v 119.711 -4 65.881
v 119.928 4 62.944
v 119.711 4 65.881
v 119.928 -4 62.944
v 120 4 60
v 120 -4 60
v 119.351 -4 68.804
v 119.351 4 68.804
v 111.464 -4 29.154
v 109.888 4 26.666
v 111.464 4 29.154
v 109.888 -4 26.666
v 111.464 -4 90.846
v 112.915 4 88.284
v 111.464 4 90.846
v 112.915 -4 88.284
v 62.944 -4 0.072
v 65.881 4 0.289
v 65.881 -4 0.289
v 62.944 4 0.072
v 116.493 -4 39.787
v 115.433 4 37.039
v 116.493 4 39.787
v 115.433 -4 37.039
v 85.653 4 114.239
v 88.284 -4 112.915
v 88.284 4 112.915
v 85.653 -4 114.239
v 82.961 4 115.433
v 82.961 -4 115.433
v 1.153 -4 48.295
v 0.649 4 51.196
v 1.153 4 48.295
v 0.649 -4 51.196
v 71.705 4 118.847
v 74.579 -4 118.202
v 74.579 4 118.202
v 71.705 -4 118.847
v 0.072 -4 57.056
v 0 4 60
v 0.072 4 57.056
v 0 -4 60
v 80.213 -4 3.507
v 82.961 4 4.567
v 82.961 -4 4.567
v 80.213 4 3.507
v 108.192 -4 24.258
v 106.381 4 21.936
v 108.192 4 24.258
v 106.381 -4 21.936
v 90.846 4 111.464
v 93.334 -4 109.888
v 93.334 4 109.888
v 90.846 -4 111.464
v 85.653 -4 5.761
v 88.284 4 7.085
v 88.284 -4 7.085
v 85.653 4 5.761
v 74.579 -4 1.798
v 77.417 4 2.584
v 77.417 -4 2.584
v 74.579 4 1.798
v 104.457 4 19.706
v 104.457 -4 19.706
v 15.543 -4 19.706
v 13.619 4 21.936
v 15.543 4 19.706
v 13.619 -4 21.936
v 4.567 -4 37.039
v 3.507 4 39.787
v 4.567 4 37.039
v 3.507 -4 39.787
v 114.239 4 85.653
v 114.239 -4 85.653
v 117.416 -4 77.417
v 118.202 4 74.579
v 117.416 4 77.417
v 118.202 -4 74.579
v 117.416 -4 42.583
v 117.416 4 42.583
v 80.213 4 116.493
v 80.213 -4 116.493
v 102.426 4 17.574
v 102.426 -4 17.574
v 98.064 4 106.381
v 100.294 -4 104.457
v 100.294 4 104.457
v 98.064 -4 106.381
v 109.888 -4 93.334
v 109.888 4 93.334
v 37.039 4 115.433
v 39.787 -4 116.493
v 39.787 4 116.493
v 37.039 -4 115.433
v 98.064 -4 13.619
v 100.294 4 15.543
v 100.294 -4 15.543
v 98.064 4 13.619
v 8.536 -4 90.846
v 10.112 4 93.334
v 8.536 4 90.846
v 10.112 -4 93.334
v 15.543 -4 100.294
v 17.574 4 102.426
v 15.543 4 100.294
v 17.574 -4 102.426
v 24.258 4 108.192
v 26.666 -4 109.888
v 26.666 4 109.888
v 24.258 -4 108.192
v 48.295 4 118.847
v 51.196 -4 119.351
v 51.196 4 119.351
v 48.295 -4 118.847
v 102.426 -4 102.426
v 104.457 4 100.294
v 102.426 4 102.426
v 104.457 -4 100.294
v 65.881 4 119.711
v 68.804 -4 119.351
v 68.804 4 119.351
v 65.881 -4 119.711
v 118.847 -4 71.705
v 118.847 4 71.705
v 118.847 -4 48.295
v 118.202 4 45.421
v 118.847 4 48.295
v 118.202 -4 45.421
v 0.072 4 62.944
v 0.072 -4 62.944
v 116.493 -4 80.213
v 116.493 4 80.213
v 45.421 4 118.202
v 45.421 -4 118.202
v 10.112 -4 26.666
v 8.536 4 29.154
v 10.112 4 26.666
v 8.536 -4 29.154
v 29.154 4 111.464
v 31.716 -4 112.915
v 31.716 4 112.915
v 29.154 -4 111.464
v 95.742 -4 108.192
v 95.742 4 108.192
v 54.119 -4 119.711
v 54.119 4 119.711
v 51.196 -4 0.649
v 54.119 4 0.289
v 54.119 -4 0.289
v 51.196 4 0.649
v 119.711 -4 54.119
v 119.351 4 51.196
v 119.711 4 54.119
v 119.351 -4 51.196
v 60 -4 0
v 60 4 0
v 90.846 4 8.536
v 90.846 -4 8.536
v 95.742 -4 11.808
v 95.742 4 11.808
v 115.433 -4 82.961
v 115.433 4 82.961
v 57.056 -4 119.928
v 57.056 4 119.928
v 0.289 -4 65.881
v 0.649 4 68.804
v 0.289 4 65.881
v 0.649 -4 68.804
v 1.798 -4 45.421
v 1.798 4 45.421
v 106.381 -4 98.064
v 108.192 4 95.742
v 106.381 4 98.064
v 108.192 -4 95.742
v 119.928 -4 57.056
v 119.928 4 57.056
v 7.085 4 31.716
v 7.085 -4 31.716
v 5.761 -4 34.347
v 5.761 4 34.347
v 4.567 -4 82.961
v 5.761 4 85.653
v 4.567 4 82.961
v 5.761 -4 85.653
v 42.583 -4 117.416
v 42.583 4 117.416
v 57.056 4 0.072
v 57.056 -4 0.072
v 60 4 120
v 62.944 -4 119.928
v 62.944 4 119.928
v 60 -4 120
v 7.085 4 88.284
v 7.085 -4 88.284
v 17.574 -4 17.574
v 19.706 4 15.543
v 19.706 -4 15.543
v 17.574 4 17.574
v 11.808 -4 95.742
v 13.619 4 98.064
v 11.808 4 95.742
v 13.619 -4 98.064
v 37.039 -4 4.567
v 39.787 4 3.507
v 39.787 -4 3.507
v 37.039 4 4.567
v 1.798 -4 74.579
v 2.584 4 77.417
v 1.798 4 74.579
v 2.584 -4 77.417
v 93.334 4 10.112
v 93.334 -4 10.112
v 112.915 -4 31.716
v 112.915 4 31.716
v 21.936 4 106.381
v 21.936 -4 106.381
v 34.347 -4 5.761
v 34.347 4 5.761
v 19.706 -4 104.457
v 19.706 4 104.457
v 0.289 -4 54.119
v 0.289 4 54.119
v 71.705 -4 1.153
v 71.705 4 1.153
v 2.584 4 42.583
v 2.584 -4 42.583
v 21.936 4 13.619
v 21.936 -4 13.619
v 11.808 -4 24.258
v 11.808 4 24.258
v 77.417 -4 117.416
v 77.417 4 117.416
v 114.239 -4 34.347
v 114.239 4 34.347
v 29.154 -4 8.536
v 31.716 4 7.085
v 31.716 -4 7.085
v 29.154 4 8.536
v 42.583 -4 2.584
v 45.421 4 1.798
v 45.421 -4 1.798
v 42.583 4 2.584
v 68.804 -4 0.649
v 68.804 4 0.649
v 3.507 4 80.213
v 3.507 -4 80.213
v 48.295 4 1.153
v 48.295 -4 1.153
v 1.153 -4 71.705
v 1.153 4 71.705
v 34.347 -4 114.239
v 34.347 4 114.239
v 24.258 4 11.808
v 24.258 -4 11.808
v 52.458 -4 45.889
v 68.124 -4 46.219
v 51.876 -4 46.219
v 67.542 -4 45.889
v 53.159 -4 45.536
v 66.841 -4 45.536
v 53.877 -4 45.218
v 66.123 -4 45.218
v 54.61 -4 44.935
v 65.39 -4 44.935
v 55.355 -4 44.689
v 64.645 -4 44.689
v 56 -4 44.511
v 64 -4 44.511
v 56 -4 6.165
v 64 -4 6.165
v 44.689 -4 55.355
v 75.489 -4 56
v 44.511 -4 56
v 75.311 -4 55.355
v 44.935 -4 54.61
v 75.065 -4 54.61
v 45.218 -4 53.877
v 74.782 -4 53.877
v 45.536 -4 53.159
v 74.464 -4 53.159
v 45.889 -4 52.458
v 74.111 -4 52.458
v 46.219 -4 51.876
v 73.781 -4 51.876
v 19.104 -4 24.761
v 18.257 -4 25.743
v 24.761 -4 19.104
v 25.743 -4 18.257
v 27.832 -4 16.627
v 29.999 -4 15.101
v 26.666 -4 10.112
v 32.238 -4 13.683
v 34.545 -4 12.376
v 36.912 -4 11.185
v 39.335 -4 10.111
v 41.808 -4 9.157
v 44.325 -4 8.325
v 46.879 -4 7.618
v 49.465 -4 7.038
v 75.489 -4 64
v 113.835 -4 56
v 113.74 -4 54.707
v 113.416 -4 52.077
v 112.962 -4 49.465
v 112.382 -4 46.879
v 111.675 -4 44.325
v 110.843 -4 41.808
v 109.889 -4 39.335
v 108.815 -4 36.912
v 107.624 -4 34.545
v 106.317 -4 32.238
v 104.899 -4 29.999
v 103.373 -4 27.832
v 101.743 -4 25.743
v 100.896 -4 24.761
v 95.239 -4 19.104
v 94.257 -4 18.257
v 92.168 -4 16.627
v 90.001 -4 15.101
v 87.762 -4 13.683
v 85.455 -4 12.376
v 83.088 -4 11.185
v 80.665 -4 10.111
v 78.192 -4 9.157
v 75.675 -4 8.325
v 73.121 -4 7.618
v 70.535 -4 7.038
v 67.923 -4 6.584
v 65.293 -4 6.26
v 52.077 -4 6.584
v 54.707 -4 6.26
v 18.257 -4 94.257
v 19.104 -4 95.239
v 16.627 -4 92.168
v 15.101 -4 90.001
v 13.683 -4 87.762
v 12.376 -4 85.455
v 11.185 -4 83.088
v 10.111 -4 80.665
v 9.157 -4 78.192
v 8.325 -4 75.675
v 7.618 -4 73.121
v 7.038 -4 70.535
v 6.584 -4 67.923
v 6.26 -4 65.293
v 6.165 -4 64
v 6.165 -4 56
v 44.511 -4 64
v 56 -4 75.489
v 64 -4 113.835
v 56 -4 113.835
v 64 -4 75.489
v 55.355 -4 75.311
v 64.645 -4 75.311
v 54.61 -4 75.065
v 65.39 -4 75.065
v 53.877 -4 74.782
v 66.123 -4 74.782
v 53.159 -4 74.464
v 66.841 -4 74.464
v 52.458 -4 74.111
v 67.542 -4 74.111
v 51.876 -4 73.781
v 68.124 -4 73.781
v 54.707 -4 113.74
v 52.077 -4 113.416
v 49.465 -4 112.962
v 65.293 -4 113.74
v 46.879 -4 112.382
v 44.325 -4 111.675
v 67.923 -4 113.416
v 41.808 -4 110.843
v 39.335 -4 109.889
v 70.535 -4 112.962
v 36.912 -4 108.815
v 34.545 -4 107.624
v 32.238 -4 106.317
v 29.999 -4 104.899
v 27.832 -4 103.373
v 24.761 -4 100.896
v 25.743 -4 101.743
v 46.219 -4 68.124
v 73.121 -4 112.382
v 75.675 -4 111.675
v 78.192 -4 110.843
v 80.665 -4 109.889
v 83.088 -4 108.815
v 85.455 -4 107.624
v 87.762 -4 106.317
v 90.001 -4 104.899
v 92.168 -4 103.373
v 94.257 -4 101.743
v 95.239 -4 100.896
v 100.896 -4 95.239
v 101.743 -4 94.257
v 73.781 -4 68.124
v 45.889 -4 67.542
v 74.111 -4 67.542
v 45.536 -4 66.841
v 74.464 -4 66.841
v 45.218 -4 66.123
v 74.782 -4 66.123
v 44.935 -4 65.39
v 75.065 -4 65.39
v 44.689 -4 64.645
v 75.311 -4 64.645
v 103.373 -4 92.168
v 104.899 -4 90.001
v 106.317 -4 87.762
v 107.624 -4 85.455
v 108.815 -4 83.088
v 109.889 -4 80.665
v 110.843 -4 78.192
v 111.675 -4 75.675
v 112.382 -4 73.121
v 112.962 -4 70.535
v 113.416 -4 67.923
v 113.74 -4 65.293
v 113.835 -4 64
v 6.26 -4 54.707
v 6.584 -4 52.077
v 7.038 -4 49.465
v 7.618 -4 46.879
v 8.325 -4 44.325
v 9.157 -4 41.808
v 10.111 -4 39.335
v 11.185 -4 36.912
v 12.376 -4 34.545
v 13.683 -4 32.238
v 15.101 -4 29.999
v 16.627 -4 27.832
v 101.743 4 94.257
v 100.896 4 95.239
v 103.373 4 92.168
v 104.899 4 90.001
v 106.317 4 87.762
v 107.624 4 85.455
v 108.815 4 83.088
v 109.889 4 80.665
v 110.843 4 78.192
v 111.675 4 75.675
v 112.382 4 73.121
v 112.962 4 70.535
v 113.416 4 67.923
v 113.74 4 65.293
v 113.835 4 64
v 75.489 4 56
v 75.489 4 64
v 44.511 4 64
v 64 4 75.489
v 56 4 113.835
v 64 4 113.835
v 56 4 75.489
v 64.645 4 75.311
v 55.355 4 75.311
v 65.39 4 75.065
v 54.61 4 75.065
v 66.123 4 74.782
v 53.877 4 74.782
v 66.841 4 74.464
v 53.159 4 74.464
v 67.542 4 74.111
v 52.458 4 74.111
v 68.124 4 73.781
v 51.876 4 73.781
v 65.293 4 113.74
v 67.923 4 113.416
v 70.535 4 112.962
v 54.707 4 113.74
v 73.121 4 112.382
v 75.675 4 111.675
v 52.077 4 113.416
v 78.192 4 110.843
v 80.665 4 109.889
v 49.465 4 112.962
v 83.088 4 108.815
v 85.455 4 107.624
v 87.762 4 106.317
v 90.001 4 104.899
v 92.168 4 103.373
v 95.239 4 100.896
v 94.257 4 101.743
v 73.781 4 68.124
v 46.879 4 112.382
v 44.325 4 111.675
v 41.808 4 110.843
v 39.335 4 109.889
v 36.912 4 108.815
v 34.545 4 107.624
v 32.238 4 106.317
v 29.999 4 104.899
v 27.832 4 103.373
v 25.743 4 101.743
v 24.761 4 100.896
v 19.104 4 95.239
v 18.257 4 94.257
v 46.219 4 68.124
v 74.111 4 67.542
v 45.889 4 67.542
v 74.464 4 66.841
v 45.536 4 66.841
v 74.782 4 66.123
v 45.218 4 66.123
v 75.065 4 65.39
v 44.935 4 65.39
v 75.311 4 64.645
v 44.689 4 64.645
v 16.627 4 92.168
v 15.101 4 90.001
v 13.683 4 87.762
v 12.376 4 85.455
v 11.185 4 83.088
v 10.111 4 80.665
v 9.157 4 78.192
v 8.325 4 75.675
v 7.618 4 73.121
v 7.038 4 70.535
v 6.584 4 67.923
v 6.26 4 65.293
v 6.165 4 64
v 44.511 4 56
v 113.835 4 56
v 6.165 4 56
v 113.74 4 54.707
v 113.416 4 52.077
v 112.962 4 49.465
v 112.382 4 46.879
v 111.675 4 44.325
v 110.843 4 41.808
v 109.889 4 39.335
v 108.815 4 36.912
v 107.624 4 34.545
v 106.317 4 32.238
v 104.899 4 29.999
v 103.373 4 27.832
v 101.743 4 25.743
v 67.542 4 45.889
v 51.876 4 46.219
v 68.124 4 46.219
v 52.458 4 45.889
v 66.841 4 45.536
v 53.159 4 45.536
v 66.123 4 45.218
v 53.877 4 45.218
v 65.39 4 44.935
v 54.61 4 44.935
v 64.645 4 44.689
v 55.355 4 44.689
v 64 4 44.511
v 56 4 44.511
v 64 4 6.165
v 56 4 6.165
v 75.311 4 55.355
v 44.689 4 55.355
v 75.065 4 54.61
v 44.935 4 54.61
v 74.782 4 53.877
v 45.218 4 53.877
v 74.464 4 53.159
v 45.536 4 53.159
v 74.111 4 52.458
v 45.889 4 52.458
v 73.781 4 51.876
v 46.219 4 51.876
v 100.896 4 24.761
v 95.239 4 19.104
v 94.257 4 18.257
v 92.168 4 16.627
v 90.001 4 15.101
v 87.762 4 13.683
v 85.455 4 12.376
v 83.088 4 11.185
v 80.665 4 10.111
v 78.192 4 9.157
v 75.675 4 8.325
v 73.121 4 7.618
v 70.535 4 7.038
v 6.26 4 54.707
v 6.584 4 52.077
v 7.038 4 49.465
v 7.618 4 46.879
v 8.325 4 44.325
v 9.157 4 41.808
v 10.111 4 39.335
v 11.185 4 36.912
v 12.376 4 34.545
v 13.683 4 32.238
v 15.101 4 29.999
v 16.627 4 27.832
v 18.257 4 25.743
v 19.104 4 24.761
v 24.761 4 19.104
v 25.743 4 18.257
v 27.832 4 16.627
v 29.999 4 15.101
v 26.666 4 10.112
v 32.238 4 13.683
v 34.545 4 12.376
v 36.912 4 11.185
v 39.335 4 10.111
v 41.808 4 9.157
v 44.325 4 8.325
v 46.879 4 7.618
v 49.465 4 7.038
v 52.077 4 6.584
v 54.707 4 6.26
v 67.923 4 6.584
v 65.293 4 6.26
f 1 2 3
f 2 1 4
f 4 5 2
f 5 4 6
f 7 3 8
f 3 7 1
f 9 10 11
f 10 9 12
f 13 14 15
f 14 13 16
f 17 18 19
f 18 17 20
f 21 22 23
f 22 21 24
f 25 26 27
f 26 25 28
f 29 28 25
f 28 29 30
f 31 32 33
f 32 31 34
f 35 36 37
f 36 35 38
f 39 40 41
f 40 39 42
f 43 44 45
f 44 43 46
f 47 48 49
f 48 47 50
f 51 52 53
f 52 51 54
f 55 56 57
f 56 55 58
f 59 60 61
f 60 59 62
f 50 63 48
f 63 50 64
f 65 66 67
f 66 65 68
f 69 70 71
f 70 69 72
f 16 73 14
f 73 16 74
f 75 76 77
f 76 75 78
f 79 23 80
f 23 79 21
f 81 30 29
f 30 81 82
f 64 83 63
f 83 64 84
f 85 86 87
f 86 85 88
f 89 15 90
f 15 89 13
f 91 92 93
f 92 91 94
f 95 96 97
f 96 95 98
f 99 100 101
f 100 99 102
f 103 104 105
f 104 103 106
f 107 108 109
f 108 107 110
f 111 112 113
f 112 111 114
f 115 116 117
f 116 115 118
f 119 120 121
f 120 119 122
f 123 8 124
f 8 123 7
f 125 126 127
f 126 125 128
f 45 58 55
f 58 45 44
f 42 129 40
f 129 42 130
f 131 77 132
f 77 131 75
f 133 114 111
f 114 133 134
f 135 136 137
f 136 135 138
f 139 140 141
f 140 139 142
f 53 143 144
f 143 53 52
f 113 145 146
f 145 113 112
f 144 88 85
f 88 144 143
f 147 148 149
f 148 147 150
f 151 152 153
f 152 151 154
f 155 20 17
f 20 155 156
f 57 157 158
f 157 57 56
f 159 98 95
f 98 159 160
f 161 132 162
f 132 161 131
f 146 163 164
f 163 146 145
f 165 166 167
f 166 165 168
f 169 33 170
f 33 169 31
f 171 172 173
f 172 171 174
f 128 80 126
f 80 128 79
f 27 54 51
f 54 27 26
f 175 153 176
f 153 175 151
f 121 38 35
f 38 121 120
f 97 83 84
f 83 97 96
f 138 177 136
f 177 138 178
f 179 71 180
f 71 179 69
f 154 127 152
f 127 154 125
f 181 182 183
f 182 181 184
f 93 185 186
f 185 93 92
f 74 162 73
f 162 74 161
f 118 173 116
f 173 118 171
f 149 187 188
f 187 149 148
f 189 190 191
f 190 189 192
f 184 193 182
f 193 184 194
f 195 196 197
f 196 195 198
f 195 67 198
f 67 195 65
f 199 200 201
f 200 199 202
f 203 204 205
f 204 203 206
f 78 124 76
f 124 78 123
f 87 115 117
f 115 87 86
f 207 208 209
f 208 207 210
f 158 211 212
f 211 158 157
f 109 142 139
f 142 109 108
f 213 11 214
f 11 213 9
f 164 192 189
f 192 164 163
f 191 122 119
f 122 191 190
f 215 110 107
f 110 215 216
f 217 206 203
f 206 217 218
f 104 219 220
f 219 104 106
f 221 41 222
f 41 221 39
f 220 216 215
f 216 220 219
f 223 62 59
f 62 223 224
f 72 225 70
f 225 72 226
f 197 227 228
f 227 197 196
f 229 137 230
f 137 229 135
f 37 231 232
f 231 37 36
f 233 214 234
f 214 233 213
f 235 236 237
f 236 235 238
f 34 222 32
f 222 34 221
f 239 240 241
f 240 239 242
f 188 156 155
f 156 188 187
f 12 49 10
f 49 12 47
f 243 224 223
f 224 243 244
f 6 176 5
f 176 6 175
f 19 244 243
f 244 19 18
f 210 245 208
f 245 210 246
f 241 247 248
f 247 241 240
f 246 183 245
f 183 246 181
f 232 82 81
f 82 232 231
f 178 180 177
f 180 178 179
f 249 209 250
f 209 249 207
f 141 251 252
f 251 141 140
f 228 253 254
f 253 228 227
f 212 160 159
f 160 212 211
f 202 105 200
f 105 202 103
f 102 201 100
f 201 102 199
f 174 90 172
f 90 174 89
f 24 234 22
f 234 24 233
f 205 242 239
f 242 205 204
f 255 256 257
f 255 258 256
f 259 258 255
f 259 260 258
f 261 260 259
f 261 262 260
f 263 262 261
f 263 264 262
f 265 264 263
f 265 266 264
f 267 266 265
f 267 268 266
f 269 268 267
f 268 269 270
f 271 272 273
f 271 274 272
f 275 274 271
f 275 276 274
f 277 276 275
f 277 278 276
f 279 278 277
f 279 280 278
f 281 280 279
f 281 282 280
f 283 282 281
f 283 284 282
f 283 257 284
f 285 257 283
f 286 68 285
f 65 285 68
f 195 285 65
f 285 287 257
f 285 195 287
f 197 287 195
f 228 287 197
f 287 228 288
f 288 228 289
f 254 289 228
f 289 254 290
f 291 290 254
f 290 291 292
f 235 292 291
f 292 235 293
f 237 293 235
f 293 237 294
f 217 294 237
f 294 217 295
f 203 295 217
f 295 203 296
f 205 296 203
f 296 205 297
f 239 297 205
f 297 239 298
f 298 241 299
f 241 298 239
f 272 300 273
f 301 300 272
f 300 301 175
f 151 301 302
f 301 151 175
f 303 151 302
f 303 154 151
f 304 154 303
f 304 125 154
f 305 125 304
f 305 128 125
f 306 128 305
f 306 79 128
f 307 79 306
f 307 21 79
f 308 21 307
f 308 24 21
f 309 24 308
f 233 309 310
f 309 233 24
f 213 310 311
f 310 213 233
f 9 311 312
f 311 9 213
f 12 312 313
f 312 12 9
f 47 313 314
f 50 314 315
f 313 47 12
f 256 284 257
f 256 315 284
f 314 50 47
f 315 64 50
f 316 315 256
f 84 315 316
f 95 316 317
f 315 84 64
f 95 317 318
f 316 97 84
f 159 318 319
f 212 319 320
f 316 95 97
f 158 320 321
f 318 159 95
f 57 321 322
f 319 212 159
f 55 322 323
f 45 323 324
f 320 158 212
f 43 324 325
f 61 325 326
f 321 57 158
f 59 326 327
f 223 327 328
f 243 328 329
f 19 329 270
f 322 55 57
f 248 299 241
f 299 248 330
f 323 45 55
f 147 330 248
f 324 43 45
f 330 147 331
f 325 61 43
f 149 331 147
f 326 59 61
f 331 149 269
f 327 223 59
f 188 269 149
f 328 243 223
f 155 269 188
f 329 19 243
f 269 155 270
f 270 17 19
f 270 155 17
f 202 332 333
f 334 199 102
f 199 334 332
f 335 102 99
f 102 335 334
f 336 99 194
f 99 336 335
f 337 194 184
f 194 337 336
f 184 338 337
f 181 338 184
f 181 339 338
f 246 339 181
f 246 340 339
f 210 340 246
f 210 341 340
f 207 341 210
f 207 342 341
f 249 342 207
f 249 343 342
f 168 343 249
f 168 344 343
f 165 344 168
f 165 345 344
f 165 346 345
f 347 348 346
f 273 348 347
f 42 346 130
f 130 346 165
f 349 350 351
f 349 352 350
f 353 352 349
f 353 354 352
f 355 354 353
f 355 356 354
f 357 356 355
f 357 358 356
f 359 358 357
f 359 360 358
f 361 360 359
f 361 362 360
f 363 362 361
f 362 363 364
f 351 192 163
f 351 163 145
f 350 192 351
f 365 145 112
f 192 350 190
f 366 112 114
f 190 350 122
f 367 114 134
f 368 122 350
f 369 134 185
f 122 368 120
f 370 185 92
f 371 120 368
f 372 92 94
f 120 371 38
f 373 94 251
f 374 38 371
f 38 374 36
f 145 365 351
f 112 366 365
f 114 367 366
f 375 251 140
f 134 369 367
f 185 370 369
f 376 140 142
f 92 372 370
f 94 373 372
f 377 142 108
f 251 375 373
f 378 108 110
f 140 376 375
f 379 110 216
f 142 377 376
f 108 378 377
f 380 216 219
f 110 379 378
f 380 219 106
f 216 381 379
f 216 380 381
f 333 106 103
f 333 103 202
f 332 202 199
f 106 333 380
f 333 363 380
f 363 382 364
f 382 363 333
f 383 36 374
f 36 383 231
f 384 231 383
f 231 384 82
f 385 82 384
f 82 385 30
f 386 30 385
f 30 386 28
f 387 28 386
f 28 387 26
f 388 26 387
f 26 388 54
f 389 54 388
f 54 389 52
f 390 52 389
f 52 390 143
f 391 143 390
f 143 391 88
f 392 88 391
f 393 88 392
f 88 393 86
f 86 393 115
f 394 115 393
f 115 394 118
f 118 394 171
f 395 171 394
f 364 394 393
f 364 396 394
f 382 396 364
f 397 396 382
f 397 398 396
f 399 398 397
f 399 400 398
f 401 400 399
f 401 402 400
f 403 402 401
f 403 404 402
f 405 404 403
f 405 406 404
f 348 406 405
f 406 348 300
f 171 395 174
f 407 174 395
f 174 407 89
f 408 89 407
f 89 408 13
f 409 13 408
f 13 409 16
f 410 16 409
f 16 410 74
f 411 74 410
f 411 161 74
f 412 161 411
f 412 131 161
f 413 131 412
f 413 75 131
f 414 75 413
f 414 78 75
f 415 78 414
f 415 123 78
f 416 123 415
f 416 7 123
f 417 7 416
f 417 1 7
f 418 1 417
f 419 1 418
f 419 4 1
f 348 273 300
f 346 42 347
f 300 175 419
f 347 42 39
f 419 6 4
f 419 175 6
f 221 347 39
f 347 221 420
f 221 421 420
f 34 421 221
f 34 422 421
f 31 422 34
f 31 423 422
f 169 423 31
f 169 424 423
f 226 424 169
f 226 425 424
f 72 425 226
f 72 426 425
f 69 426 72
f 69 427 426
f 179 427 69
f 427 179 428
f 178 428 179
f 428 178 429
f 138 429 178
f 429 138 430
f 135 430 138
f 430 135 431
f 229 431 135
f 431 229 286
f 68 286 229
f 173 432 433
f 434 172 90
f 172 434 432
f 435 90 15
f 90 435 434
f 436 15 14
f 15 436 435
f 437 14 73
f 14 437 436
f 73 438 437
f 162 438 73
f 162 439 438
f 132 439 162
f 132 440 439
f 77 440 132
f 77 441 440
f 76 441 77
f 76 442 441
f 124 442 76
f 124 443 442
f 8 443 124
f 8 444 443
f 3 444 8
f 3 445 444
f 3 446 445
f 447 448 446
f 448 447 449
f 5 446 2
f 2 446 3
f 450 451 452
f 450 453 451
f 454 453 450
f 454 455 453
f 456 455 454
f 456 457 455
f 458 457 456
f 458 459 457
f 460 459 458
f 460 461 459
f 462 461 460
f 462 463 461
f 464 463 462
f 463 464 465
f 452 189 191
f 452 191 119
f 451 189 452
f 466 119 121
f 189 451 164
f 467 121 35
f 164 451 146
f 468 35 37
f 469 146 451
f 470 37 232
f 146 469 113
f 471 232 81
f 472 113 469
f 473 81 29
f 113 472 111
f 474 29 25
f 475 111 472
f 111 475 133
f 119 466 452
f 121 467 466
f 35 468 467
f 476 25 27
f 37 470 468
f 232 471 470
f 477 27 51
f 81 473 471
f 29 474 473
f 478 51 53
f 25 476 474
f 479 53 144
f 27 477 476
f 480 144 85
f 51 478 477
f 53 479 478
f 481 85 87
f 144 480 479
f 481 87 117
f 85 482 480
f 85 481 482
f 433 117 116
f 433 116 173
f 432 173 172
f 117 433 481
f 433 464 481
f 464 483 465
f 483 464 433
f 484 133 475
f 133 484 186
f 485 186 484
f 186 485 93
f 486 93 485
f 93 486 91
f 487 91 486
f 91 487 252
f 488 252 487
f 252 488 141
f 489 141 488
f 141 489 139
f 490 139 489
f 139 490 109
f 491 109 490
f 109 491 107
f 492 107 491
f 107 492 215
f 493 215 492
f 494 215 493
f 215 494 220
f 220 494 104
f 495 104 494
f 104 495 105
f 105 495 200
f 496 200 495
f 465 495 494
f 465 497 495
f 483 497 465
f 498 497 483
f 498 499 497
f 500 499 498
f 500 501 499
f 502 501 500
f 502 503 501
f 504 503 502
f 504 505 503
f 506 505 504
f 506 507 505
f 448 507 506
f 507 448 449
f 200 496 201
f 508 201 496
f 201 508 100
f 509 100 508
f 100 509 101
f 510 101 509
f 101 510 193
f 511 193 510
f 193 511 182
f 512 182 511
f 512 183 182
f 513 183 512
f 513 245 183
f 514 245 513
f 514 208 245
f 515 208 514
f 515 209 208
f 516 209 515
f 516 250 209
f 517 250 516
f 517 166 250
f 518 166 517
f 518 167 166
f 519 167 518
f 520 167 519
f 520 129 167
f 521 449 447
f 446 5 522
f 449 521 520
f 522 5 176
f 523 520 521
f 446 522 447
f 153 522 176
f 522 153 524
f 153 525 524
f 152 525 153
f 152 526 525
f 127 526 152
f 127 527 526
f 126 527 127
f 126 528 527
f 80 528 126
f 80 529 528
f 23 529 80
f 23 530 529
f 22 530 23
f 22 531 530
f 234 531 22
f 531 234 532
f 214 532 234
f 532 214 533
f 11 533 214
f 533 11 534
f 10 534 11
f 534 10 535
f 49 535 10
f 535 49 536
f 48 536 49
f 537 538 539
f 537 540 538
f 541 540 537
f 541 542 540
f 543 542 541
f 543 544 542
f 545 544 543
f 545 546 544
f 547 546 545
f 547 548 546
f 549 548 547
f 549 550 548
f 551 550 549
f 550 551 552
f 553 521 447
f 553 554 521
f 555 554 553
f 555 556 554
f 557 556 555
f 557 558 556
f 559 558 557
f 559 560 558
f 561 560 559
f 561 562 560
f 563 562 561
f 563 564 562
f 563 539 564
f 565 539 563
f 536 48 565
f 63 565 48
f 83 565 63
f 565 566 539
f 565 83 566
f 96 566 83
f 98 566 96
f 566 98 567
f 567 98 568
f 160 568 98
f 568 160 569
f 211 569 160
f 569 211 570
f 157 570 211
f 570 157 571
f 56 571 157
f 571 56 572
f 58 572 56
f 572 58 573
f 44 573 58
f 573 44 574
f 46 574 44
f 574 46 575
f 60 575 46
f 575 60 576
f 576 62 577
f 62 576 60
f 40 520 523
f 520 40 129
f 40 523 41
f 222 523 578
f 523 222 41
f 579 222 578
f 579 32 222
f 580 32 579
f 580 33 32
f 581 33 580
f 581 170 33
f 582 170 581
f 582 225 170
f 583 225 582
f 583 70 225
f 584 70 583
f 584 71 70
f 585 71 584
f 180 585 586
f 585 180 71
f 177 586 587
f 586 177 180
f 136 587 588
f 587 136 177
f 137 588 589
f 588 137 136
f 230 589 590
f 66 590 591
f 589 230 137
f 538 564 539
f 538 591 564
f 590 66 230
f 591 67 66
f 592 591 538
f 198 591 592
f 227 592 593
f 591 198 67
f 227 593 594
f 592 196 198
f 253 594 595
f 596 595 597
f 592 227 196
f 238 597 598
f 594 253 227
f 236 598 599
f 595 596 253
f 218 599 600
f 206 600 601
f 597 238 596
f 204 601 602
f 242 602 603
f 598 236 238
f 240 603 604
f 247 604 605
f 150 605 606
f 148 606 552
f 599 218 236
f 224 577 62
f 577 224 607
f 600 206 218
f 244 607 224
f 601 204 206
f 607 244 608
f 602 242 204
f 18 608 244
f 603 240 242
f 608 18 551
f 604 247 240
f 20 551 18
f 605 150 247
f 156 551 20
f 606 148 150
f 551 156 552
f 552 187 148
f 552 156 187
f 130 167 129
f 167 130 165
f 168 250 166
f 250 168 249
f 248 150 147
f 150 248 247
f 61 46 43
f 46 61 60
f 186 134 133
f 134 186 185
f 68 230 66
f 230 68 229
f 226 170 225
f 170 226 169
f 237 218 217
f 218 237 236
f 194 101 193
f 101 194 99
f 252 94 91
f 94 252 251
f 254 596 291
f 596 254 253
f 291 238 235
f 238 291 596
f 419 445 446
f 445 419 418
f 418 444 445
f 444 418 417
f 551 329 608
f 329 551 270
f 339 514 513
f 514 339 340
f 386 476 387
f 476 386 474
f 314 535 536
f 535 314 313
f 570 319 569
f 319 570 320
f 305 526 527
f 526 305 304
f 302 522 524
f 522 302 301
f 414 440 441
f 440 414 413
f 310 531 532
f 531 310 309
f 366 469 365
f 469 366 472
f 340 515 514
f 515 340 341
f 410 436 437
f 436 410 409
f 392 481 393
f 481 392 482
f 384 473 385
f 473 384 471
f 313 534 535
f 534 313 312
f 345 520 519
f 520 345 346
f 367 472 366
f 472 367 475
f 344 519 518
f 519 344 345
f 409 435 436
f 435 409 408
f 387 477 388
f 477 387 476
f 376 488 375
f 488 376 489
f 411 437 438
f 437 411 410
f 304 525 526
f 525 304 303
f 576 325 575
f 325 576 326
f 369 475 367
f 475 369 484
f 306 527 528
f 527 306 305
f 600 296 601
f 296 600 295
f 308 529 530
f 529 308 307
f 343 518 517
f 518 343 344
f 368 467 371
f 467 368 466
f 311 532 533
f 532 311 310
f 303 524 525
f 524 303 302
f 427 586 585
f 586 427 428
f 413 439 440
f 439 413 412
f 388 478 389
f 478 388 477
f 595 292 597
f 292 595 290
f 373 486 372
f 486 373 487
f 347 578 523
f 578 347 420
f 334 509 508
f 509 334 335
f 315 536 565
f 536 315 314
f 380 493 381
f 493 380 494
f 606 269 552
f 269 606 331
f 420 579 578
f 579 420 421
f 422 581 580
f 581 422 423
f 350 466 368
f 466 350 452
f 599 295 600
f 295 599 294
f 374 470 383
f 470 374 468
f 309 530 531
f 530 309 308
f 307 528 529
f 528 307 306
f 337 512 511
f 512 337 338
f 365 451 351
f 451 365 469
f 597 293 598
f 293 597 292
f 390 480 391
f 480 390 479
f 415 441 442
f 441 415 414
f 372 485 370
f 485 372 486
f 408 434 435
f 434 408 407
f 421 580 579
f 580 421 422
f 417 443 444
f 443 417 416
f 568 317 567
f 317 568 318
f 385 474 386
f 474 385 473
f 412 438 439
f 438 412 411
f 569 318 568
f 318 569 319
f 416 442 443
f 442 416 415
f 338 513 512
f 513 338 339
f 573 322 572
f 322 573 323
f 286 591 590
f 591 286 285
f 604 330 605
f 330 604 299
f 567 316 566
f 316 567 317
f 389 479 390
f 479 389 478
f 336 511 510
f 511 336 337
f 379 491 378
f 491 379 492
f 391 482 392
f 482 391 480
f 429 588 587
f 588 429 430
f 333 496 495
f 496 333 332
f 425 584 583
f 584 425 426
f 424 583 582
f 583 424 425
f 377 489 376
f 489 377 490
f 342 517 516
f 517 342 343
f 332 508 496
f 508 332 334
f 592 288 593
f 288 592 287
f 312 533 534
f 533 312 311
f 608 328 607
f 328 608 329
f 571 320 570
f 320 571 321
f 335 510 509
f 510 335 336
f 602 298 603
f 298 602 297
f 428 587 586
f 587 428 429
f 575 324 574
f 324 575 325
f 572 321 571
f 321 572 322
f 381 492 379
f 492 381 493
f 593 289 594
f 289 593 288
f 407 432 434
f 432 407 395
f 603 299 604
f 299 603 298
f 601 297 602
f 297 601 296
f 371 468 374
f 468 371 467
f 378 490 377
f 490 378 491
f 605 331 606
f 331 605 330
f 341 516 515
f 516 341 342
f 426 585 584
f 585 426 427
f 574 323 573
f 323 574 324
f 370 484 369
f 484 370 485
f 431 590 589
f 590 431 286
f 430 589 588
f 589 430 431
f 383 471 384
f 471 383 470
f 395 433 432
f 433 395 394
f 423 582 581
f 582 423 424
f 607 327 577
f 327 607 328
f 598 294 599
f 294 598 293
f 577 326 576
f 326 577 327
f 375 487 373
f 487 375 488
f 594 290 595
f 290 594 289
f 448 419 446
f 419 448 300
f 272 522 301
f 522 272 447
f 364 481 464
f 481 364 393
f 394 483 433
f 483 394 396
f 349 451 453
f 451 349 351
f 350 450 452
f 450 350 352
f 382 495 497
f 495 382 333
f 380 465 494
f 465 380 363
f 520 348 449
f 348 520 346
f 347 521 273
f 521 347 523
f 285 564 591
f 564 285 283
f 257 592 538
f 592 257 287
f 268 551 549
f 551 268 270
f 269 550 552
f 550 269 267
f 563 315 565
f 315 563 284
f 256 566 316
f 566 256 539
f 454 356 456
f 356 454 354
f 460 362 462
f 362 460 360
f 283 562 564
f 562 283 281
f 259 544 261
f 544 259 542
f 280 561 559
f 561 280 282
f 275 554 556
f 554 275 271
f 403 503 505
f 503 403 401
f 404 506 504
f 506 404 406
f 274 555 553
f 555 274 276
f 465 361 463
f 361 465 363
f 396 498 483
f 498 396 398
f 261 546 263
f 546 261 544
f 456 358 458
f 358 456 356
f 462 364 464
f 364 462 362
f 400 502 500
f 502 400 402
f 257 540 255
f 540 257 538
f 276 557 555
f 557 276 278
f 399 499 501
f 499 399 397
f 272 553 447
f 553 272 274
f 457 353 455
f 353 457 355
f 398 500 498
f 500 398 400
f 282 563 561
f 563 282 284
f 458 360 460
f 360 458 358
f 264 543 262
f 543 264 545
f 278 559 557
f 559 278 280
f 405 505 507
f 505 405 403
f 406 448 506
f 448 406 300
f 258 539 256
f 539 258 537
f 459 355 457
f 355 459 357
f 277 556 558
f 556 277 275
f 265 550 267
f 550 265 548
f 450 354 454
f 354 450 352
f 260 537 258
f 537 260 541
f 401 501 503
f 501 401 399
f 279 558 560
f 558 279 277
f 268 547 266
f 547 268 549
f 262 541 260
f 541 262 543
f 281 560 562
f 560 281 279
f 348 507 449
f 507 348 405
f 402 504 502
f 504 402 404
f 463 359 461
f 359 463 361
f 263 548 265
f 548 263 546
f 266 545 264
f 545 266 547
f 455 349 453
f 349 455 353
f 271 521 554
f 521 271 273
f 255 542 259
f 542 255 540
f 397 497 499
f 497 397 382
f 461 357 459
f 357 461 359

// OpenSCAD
$fn=128;
/* doodle-meta {"version":1,"parameters":{"outer_diameter":{"label":"Outer diameter","description":"Outer rim diameter","unit":"mm"},"hub_diameter":{"label":"Hub","description":"Hub diameter","unit":"mm"},"spoke_width":{"label":"Spoke width","description":"Spoke bar thickness","unit":"mm"}}} */
// Wheel lies in XZ. FIXED: spokes extend to overlap the rim inner wall.
outer_diameter = 120; // mm
rim_inner_diameter = 108; // mm
hub_diameter = 32; // mm
thickness = 8; // mm
spoke_count = 8; // count
spoke_width = 8; // mm
spoke_reach = 40; // mm from hub overlap start; extends into the rim
translate([outer_diameter/2,thickness/2,outer_diameter/2]) rotate([90,0,0]) union(){
  difference(){cylinder(d=outer_diameter,h=thickness);translate([0,0,-1])cylinder(d=rim_inner_diameter,h=thickness+2);}
  cylinder(d=hub_diameter,h=thickness);
  for(a=[0:360/spoke_count:360-360/spoke_count])rotate([0,0,a])translate([hub_diameter/2-1,-thickness/2,0])cube([spoke_reach,thickness,thickness]);
}
